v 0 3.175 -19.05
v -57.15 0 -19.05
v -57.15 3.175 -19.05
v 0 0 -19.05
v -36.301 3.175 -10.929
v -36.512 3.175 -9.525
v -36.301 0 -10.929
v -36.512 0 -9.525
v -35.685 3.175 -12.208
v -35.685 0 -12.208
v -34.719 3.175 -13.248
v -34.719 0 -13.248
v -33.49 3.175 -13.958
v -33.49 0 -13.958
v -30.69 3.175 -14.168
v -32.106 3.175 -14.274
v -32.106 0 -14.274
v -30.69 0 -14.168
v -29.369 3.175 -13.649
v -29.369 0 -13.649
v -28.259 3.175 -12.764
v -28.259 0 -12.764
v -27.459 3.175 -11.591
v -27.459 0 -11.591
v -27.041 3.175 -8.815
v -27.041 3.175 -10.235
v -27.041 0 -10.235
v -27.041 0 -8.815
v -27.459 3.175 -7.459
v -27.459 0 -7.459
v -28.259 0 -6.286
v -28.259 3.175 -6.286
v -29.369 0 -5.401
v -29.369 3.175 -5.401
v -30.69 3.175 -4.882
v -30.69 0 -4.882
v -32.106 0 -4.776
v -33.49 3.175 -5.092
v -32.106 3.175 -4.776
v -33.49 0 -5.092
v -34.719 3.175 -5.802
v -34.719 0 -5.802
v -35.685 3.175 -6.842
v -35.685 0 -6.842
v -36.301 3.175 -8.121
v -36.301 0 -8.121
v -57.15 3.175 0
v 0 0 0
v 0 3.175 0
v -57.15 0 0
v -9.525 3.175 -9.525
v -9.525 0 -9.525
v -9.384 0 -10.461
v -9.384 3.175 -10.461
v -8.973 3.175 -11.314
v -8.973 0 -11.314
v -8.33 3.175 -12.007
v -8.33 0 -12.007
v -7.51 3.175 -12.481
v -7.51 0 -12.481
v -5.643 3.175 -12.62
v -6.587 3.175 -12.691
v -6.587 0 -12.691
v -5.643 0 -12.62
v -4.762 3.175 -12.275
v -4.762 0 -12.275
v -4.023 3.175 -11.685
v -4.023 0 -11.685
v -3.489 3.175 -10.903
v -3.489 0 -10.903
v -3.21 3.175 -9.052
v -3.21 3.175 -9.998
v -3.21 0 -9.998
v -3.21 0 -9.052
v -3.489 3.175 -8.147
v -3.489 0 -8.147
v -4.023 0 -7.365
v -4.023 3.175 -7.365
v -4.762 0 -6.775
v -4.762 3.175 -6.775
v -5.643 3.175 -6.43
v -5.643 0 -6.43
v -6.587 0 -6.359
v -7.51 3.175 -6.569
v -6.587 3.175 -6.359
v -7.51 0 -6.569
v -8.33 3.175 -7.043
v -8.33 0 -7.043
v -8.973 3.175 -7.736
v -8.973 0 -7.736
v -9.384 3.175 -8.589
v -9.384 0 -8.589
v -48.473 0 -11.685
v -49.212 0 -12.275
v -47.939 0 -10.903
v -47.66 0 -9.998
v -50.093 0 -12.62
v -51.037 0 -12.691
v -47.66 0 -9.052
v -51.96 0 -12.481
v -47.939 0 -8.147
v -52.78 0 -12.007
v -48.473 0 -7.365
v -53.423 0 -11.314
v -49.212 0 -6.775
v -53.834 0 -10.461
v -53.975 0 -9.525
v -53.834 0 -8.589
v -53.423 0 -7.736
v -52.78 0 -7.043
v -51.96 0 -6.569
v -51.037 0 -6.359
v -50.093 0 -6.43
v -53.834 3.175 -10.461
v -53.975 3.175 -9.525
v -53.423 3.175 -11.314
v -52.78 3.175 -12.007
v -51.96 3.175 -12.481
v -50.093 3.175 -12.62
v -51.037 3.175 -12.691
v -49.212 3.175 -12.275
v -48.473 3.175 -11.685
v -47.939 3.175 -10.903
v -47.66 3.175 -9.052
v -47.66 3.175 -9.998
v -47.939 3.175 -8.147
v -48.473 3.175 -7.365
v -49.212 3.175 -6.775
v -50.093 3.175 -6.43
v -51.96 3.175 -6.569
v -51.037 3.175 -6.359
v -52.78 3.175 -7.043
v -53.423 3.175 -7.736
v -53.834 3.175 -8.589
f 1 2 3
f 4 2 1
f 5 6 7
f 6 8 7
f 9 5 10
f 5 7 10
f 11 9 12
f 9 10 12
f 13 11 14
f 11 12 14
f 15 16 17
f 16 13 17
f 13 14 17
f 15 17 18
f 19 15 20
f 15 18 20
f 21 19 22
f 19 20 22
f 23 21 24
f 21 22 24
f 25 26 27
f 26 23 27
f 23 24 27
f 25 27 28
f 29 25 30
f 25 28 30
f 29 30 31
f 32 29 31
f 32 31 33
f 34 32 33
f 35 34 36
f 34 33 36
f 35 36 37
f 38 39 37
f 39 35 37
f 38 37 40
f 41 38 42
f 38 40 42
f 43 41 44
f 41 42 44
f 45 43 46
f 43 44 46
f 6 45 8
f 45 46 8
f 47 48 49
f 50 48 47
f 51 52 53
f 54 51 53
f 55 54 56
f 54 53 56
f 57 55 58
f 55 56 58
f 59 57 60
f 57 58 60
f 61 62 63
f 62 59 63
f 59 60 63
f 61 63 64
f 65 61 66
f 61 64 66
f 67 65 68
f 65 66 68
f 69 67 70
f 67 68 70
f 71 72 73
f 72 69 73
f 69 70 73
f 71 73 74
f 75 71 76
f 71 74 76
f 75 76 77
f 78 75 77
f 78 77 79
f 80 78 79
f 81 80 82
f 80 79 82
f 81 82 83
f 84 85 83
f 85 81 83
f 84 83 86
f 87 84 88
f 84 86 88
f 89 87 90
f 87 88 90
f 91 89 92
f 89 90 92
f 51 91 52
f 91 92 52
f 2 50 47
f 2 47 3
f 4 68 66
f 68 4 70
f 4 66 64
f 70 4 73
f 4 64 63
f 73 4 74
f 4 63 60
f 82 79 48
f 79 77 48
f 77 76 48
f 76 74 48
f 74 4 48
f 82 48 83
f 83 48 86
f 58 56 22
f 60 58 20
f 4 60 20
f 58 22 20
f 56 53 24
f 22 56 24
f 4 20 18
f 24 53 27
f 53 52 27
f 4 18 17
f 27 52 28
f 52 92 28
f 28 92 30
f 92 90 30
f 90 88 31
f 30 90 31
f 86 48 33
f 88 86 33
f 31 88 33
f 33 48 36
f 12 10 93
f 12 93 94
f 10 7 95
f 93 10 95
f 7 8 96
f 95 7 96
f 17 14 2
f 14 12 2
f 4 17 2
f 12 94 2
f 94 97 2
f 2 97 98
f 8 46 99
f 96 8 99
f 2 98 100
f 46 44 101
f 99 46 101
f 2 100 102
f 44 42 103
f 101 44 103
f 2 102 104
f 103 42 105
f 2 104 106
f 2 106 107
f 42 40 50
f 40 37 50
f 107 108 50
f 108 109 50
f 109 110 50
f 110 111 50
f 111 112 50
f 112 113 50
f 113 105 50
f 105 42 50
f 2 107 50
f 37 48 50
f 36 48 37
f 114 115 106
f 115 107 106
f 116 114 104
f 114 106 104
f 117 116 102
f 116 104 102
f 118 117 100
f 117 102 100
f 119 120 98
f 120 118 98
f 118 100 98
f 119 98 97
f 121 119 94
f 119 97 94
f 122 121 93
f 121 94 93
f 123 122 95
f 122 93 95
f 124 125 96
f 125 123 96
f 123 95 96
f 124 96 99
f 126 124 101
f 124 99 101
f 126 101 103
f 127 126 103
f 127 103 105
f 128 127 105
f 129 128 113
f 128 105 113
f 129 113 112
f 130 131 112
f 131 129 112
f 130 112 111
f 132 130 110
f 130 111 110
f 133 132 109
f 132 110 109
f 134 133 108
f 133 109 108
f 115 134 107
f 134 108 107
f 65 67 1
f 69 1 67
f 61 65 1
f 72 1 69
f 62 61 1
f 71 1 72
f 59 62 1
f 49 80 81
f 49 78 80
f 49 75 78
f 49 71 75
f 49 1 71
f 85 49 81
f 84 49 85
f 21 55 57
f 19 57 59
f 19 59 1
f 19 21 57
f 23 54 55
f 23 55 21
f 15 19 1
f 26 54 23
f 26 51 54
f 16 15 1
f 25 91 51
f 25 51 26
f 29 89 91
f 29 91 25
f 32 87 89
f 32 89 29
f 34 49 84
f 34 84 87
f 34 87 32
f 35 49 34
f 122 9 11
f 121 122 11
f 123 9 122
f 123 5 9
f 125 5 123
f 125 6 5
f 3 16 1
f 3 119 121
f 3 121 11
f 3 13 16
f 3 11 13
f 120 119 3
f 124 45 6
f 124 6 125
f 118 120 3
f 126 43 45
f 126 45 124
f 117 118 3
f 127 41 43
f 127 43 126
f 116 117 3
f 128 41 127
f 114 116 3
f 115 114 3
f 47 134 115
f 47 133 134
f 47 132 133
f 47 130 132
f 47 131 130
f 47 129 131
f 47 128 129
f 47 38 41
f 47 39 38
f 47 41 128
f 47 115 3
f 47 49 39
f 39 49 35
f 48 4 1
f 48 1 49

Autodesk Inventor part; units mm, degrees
ref_plane "YZ Plane" through (0, 0, 0) normal (1, 0, 0) x (0, 1, 0)
ref_plane "XZ Plane" through (0, 0, 0) normal (0, 1, 0) x (-1, 0, 0)
ref_plane "XY Plane" through (0, 0, 0) normal (0, 0, 1) x (1, 0, 0)
sketch "Sketch1" plane through (0, 0, 0) normal (0, 1, 0) x (-1, 0, 0)
  line L0 (0, 0) -> (57.15, 0)
  line L1 (57.15, 0) -> (57.15, -19.05)
  line L2 (57.15, -19.05) -> (0, -19.05)
  line L3 (0, -19.05) -> (0, 0)
  circle A0 centre (6.35, -9.525) radius 3.175
  circle A1 centre (50.8, -9.525) radius 3.175
  circle A2 centre (31.75, -9.525) radius 4.7625
  dimension "d0" = 57.15
  dimension "d1" = 19.05
  dimension "d2" = 6.35
  dimension "d3" = 6.35
  dimension "d4" = 9.525
  dimension "d5" = 6.35
  dimension "d6" = 6.35
  dimension "d7" = 9.525
  dimension "d12" = 9.525
  dimension "d13" = 31.75
  dimension "d14" = 9.525
extrude "Extrusion1" add sketch "Sketch1" along normal blind 3.175 contours L0 L1 L2 L3 | A2
extrude "Extrusion2" cut sketch "Sketch1" along normal blind 3.175 contours A2
properties part number "15102898-16-P-0224"
